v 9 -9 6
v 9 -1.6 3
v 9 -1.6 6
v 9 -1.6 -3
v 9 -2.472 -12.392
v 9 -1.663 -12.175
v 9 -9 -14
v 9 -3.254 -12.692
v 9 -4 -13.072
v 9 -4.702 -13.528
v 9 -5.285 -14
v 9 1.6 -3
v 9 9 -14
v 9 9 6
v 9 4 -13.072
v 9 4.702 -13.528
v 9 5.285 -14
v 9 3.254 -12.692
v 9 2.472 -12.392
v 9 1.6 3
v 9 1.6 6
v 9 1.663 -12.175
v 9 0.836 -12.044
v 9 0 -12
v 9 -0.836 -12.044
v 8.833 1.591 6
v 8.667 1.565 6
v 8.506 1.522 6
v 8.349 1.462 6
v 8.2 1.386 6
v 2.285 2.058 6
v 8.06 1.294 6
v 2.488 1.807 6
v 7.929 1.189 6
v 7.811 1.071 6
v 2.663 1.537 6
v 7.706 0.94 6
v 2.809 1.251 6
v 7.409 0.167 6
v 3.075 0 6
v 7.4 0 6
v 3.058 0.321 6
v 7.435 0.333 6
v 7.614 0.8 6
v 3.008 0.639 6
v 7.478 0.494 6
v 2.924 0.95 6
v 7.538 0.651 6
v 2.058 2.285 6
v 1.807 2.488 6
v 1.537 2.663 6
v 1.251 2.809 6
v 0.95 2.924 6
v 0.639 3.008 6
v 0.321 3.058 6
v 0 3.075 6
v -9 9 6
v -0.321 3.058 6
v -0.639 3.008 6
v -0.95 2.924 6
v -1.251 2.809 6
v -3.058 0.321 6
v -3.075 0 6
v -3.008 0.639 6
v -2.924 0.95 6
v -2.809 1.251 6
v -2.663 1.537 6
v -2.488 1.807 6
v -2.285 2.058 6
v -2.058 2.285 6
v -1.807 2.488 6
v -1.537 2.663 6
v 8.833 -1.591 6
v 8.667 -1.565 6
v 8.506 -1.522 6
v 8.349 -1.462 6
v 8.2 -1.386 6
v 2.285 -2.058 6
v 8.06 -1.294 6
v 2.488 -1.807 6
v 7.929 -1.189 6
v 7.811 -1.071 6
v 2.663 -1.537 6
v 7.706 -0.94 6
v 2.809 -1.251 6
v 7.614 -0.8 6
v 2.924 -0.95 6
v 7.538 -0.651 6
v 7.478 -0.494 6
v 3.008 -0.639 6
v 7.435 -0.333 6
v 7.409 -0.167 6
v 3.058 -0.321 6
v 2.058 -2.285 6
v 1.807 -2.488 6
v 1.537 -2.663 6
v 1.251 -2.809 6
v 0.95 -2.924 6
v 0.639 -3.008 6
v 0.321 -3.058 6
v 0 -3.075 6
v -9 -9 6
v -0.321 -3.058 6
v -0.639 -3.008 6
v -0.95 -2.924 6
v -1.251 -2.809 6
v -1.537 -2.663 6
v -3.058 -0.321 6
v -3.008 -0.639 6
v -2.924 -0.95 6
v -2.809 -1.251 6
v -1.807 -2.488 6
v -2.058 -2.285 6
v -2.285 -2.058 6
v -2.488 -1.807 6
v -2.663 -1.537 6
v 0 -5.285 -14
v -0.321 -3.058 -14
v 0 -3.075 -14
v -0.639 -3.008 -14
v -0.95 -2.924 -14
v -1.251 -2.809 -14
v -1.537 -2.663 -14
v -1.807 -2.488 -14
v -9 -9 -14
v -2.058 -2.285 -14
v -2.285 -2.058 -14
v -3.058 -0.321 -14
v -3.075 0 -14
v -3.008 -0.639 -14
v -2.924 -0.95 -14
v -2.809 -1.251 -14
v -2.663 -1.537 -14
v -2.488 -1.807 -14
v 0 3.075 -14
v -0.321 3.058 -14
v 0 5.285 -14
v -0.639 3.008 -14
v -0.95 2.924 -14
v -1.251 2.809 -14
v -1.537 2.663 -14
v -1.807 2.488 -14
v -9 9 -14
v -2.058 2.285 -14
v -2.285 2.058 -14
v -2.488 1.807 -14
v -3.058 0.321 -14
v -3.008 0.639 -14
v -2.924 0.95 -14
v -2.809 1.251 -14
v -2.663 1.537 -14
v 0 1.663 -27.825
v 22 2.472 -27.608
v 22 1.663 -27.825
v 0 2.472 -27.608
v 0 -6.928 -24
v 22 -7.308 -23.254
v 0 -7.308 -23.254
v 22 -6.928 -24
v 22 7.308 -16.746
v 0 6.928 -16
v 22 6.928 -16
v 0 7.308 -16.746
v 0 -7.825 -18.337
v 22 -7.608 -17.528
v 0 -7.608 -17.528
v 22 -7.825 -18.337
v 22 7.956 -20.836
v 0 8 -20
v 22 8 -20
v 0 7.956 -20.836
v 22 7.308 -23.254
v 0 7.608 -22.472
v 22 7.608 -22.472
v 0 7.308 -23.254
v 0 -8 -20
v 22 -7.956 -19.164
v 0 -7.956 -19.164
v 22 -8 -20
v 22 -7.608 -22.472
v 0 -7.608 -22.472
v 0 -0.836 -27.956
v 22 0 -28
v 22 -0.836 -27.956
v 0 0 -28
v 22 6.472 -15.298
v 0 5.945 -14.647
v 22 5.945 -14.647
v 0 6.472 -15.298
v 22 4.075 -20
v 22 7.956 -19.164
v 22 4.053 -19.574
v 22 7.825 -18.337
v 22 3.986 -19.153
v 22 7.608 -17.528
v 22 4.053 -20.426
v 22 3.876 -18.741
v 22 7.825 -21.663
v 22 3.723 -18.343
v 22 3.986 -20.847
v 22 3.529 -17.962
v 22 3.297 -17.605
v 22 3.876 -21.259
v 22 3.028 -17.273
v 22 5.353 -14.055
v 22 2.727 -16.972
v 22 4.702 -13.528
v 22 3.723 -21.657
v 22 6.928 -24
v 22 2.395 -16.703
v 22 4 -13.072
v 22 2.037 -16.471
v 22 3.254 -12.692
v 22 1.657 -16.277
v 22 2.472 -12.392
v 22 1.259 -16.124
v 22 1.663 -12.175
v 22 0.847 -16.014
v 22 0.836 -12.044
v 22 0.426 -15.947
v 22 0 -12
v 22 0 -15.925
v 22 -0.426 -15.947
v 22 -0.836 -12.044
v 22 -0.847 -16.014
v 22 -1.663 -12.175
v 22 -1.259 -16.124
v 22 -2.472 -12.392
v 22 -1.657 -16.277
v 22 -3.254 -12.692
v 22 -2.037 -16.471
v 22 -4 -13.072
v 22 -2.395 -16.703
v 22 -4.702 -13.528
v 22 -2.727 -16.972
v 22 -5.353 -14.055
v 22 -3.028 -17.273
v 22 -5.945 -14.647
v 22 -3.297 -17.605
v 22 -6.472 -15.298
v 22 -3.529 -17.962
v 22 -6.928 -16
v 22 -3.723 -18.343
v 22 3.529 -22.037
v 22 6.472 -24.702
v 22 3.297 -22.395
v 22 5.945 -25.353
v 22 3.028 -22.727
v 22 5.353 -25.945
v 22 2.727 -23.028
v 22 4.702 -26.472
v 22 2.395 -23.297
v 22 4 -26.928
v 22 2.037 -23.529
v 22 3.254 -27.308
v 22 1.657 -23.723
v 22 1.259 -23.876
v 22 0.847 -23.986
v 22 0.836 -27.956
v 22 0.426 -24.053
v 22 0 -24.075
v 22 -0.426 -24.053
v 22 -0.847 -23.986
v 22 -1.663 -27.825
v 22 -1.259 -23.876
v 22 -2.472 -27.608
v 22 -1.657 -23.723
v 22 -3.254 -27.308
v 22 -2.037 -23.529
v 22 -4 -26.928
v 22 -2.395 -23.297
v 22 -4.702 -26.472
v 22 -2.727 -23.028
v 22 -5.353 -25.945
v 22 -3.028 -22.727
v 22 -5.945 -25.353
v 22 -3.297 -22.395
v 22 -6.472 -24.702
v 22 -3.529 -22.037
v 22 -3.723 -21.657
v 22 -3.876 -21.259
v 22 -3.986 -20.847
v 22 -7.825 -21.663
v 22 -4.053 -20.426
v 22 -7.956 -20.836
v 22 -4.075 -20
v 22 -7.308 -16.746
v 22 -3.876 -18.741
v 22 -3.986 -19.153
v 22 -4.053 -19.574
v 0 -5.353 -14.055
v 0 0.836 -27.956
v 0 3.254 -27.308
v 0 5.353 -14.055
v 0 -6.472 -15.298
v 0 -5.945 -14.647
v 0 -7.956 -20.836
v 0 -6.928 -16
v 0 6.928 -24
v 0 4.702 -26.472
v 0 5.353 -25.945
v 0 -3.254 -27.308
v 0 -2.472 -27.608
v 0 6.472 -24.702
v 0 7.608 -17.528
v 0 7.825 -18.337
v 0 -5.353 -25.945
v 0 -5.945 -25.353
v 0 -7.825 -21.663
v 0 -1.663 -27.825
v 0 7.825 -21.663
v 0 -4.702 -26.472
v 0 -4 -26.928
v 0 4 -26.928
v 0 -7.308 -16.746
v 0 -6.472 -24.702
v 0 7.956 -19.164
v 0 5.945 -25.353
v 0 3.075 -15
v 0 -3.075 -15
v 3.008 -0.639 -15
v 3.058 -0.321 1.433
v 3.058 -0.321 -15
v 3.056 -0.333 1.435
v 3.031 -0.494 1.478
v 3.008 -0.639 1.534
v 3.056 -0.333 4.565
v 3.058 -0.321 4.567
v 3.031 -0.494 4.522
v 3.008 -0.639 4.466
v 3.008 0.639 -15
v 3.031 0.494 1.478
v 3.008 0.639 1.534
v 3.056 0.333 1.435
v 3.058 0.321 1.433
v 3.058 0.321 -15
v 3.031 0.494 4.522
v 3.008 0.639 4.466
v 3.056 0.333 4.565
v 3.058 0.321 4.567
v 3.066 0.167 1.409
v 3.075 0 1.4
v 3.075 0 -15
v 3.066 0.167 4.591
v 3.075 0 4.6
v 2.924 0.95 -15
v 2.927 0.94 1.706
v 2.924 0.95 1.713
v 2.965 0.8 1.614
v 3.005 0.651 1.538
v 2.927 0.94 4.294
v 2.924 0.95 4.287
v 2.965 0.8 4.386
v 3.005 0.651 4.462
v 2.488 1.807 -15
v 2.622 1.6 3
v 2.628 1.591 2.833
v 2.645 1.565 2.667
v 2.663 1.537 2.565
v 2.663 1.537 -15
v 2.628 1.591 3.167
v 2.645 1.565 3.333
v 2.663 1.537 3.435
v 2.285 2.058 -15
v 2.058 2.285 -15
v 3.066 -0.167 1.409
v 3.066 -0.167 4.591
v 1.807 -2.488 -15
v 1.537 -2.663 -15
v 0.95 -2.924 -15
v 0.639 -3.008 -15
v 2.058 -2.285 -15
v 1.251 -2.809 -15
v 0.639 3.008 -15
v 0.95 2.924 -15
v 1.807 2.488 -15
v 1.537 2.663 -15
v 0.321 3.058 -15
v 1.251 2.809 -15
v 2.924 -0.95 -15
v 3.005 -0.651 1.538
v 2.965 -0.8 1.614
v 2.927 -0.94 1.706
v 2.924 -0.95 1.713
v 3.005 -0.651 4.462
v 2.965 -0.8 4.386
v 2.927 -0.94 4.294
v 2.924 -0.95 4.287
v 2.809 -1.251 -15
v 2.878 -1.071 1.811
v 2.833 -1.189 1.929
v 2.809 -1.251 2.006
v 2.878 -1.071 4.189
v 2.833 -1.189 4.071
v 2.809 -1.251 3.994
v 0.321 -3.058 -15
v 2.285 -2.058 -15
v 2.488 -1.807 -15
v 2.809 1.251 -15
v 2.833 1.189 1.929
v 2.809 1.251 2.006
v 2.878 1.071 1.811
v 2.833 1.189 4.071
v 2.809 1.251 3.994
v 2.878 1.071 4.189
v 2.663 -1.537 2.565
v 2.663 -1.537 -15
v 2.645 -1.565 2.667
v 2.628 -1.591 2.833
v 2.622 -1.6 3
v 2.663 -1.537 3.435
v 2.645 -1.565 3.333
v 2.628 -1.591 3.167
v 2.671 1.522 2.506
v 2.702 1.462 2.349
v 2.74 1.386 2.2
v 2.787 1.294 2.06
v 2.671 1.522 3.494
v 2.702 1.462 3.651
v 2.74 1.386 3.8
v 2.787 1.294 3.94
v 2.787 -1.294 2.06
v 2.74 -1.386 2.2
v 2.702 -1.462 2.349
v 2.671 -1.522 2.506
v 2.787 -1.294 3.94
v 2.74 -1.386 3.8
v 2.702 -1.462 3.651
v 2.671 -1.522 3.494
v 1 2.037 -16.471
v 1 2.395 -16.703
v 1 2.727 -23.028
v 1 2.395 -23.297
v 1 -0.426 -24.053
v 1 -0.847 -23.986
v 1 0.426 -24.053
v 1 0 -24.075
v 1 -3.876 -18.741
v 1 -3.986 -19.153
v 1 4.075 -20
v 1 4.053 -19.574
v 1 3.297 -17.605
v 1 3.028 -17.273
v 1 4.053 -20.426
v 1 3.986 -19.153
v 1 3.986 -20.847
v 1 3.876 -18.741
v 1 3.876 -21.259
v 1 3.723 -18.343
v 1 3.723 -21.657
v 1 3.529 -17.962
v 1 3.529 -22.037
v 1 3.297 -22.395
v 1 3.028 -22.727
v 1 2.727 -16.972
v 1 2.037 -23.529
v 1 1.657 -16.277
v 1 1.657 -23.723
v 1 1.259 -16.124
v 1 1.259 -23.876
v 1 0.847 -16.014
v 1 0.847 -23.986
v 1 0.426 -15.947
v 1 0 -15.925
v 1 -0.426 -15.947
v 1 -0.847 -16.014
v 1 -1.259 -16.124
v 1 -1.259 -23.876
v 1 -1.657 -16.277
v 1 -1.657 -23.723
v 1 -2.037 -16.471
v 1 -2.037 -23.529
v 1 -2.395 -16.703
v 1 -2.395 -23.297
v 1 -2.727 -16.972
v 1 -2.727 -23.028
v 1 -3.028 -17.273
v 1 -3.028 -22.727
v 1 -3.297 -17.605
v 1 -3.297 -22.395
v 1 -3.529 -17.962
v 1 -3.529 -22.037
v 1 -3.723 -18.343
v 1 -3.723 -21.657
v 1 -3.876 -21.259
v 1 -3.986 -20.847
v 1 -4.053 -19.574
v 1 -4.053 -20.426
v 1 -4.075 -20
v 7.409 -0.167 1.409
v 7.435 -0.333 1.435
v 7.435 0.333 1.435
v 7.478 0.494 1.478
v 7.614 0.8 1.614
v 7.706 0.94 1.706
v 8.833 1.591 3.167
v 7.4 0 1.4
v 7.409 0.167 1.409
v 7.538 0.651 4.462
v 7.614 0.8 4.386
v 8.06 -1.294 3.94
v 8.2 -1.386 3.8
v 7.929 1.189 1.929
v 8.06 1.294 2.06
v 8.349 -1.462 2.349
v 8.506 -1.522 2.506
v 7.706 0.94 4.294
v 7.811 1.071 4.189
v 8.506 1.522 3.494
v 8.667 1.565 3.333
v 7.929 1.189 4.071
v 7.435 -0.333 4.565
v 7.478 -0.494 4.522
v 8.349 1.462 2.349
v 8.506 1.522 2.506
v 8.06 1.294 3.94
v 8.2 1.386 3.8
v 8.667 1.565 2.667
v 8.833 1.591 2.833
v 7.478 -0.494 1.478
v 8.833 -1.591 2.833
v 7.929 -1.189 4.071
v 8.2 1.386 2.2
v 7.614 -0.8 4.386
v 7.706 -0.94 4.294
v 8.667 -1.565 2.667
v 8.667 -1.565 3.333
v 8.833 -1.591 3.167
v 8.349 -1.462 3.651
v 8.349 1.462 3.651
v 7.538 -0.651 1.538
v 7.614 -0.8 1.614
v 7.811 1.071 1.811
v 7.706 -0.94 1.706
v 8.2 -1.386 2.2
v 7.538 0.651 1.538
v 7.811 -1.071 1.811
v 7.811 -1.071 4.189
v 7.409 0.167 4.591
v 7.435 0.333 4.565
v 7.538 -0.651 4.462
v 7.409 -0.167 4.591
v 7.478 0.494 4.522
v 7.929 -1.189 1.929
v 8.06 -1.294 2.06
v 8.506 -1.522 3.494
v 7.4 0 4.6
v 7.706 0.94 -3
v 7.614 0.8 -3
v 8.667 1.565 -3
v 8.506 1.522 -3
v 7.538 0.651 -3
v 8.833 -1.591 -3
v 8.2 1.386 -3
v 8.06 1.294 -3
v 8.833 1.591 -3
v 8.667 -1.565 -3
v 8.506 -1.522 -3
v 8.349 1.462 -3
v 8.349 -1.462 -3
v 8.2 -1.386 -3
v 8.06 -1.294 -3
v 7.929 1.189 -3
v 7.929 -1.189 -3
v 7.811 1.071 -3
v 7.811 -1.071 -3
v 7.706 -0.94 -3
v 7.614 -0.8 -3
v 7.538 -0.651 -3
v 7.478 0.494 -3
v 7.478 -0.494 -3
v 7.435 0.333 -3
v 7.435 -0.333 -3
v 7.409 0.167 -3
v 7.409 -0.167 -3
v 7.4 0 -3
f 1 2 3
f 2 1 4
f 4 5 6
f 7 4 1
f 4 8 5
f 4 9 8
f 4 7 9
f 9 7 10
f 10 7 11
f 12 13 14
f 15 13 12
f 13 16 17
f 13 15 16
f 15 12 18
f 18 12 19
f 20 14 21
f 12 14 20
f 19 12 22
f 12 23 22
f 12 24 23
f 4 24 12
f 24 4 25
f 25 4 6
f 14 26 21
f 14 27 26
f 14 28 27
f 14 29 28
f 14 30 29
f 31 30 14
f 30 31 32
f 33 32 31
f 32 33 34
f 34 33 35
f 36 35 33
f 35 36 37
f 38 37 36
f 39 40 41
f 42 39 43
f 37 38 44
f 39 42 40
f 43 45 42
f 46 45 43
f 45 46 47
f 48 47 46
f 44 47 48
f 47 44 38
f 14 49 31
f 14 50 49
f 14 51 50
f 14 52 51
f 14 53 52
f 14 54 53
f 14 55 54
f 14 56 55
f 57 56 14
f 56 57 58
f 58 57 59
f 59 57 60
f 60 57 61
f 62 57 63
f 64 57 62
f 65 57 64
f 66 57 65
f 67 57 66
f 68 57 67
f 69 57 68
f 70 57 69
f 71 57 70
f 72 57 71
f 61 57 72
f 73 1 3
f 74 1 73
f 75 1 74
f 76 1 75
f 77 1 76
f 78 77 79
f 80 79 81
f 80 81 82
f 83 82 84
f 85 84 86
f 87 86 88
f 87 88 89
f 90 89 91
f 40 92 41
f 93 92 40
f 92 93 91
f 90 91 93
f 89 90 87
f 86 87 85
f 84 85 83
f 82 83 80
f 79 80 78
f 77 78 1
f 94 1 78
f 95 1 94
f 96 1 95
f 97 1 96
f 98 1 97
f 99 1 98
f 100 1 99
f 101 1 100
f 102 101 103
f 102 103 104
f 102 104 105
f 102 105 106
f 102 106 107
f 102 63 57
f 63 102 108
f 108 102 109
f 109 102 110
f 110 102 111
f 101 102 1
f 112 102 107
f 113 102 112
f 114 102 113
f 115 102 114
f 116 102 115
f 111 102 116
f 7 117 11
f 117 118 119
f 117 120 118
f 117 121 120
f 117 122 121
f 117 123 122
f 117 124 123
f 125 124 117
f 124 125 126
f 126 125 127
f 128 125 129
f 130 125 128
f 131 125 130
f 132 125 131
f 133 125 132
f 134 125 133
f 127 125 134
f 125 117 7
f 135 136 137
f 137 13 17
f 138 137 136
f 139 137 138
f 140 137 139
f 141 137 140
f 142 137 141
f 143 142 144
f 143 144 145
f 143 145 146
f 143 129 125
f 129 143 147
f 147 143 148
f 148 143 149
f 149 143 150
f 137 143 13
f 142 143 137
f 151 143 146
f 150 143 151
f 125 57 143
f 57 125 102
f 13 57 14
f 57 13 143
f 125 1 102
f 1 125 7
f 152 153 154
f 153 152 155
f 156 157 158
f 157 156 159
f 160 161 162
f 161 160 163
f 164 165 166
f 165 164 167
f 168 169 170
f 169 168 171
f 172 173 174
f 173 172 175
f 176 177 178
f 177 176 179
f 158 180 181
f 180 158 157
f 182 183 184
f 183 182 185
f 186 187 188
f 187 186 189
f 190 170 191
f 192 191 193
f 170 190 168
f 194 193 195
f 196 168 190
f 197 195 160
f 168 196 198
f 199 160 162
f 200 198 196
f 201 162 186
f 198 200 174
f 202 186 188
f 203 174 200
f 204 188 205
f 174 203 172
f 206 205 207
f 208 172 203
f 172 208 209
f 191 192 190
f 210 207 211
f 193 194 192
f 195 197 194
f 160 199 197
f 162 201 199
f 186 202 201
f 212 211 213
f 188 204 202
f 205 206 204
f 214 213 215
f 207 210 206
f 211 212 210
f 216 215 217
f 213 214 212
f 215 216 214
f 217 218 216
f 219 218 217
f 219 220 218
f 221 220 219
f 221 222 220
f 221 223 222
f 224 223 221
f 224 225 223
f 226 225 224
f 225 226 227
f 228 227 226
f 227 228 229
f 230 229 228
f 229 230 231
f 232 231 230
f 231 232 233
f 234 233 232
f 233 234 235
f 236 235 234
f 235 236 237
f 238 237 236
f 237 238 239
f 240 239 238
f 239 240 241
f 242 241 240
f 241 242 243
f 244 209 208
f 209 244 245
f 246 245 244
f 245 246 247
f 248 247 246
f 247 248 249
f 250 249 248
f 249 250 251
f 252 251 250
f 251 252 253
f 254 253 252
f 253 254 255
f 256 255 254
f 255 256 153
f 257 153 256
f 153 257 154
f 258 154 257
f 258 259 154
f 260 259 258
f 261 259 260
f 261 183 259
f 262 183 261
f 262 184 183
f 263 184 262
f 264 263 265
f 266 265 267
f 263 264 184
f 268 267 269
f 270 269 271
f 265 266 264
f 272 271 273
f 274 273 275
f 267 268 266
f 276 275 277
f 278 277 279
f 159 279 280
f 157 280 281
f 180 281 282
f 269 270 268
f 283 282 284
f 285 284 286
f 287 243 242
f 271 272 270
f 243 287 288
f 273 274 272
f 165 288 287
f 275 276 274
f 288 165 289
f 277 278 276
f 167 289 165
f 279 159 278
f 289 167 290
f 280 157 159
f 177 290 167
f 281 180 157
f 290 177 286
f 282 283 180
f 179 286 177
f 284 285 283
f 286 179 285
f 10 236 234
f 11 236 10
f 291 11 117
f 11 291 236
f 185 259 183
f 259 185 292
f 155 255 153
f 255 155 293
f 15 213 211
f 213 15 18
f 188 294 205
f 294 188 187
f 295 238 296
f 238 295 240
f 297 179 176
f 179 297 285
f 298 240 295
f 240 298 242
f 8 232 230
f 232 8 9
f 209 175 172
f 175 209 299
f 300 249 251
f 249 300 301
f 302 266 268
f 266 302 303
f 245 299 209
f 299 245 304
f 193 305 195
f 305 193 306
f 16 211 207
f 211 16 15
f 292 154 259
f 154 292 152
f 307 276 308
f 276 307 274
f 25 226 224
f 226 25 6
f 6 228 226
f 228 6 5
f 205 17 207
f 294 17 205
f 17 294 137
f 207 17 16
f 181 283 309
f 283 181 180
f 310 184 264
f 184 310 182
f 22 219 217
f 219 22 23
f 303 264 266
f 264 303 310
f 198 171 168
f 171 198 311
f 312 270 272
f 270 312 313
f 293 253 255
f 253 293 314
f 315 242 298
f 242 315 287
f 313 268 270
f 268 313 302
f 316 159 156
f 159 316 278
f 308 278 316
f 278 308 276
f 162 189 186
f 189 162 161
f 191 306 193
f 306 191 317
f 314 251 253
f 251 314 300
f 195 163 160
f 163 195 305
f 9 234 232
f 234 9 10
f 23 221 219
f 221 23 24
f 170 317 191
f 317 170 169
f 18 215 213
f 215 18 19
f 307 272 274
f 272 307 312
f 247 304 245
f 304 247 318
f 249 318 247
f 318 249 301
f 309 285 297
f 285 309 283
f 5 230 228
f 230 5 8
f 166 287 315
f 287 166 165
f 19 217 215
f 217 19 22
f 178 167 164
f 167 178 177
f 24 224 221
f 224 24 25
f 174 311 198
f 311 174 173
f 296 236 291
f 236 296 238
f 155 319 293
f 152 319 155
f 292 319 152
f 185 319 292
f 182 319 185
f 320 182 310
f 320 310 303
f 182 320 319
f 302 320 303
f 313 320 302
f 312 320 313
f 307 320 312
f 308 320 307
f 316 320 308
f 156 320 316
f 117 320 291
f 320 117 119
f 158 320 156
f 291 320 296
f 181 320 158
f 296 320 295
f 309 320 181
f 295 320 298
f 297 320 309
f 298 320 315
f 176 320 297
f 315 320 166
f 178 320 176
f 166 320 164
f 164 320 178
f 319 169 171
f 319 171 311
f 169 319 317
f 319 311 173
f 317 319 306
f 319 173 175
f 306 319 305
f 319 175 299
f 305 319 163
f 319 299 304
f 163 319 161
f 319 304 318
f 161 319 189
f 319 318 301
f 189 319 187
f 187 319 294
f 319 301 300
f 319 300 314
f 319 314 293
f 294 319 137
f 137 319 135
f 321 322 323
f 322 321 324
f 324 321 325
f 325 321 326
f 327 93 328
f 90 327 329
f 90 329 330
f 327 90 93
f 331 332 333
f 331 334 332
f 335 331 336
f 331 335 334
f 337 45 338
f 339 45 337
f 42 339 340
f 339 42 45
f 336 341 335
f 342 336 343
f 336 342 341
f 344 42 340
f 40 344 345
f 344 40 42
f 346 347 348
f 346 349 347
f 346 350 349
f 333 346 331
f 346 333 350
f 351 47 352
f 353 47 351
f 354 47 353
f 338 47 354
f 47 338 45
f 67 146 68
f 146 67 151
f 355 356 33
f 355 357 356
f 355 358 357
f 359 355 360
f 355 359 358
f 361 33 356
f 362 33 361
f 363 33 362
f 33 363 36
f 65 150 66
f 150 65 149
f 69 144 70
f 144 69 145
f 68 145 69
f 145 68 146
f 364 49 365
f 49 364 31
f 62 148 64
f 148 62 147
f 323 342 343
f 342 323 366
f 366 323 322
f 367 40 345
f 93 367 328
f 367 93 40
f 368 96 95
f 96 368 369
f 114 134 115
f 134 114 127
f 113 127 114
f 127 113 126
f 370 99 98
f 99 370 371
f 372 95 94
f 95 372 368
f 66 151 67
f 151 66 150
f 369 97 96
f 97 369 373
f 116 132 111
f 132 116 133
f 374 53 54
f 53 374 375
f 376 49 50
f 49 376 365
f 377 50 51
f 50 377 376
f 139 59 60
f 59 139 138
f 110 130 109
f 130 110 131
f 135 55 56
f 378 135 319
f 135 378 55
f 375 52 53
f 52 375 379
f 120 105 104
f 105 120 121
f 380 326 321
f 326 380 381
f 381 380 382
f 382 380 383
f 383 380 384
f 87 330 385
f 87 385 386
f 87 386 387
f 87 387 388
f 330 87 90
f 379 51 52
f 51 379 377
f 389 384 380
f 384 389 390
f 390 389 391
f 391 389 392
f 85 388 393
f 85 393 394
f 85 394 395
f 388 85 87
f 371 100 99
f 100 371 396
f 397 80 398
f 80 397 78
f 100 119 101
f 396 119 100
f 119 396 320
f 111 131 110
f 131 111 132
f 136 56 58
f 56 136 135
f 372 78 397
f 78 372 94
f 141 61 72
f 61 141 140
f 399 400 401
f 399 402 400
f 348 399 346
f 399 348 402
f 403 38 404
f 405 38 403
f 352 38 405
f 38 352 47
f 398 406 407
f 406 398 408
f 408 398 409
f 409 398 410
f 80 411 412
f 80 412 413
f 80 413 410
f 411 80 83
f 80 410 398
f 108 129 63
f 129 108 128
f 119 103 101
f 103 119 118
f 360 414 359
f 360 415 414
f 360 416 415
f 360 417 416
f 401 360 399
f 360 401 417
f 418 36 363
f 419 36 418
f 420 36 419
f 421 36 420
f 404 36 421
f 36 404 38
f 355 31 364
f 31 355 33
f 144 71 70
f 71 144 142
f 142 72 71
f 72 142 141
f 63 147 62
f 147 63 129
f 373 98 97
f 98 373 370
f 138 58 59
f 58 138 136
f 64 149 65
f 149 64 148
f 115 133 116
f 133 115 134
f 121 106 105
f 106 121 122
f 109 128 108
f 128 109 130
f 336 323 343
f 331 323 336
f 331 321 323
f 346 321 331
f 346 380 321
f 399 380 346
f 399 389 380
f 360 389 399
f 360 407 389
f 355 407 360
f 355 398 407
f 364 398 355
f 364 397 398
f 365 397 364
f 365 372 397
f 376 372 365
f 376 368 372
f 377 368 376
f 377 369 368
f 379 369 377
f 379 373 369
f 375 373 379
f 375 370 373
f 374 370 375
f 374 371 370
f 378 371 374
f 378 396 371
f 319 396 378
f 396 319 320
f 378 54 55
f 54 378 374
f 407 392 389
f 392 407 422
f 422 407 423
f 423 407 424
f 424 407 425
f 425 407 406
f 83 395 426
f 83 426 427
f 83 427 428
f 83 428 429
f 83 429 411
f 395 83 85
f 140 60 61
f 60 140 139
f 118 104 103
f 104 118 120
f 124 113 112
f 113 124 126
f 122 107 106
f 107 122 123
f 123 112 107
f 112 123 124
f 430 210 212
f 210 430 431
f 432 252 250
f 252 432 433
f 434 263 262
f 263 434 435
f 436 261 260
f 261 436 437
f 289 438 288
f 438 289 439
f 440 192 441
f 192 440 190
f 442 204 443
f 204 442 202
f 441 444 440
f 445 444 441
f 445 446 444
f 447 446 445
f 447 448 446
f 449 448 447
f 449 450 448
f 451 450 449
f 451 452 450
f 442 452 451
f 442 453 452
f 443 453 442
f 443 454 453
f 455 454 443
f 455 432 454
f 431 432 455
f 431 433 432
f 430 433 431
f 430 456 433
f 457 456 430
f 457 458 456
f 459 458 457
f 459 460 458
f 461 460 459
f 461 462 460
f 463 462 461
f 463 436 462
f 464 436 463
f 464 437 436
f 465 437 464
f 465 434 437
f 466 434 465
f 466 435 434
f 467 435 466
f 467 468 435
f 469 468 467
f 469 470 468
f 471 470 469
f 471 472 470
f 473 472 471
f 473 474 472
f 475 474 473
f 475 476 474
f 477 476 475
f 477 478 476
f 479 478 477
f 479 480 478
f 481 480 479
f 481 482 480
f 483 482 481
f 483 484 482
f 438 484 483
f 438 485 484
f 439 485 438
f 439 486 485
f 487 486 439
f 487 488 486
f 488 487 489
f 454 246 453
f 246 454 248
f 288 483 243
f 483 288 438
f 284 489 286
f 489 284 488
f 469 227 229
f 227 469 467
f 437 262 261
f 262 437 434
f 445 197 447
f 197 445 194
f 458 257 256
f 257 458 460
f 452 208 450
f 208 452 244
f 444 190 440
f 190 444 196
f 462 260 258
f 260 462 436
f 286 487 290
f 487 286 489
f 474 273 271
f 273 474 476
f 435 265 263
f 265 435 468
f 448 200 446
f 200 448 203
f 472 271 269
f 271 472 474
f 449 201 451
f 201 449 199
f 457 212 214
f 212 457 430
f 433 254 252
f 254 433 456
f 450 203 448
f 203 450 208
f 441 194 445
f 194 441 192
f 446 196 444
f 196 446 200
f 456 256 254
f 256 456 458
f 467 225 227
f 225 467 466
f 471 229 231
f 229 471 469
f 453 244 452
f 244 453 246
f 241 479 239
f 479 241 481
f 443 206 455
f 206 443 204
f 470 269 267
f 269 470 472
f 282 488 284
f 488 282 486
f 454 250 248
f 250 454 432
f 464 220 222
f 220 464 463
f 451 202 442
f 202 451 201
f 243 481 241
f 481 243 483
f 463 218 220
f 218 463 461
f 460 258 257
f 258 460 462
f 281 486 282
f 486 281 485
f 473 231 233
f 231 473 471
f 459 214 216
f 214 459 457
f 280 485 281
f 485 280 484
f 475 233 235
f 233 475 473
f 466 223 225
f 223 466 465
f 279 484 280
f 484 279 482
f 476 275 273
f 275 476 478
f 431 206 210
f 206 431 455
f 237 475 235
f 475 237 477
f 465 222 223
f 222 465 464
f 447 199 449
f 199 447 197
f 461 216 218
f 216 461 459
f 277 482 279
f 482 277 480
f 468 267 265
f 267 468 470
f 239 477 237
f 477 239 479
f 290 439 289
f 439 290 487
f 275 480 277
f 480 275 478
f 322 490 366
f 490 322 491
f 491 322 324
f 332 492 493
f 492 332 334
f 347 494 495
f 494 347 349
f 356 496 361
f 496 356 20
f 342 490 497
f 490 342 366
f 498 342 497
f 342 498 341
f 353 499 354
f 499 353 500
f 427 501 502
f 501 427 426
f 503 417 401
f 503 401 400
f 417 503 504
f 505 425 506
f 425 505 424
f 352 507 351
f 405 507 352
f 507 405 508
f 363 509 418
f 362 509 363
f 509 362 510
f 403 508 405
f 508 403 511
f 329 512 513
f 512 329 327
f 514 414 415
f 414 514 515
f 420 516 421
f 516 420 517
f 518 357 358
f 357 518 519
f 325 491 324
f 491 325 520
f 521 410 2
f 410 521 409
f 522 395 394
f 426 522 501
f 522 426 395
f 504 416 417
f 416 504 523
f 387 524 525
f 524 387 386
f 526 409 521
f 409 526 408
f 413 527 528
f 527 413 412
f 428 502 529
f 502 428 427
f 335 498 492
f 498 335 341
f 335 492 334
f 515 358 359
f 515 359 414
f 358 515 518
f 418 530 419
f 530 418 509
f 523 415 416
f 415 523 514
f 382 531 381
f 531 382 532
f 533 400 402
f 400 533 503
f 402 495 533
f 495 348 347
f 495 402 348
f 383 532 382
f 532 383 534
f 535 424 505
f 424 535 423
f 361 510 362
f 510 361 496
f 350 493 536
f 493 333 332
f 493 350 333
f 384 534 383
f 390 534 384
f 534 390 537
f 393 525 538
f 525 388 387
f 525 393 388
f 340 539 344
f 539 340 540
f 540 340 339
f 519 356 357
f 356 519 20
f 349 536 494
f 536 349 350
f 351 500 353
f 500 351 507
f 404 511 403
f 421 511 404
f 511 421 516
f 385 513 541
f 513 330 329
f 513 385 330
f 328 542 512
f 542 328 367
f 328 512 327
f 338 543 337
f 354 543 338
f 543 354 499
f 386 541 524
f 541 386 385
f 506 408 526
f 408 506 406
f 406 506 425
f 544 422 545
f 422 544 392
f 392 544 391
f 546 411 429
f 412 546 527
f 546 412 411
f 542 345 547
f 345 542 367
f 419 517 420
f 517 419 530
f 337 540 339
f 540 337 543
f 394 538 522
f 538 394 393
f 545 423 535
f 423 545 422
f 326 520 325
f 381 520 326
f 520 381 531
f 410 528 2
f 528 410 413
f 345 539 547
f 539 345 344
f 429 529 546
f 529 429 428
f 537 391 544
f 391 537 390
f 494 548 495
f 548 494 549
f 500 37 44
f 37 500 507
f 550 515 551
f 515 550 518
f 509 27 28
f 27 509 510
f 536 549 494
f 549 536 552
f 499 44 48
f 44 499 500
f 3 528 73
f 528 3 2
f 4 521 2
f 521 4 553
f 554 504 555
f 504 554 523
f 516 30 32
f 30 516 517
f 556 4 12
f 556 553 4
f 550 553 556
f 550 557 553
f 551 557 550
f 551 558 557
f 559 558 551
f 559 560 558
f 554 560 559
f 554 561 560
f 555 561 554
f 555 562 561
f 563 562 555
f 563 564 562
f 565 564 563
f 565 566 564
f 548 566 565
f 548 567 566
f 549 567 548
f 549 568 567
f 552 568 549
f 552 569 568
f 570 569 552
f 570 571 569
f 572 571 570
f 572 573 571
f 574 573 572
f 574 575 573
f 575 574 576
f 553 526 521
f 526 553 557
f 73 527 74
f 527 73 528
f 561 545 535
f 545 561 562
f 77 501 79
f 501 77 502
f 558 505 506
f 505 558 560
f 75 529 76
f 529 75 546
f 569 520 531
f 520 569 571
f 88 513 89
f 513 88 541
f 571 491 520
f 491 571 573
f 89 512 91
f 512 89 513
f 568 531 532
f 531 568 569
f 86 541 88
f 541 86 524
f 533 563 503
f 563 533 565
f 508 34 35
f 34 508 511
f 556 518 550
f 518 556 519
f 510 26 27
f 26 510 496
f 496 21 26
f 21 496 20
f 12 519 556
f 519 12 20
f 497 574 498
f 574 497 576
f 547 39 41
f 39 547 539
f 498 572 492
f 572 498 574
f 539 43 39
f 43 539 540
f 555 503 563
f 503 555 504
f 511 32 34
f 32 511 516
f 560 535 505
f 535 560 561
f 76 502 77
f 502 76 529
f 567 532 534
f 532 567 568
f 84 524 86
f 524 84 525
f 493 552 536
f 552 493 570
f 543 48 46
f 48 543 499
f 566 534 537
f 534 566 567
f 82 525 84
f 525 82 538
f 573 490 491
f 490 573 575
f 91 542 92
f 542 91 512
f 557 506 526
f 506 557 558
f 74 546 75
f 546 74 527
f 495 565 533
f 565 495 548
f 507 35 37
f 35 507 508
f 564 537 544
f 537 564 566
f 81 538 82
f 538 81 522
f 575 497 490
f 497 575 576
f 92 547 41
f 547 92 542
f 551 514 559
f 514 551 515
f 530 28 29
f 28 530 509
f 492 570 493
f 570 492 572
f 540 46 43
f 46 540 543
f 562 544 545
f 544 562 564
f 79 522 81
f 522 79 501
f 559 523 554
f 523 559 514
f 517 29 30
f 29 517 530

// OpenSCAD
// ============================================================
// arm_mount.scad  —  Furuta 臂座
// 功能：连接 6mm 垂直主轴 → 8mm 水平铝管
// ============================================================

$fn  = 60;
TOL  = 0.15;   // 孔公差 (紧配合可减小)
WALL = 4;      // 孔壁最小厚度 mm

// ---------- 参数 ----------
SHAFT_D = 6;         // 主轴直径
TUBE_D  = 8;         // 铝管外径
TUBE_L  = 16;        // 管插入深度
SCREW_D = 3.0;       // 顶丝孔 (M3)

BODY_H  = 20;        // 总高度
BODY_W  = 18;        // 主轴块宽
BODY_D  = 18;        // 主轴块深
BOSS_D  = 16;        // 管套外径

// ---------- 主体 ----------
difference() {
    union() {
        // 主轴块 (居中)
        translate([-BODY_W/2, -BODY_D/2, -(TUBE_L/2+WALL+2)])
            cube([BODY_W, BODY_D, BODY_H]);

        // 管套 (水平伸出)
        translate([0, 0, -(TUBE_L/2+WALL) - TUBE_L/2])
            rotate([0, 90, 0])
                cylinder(d=BOSS_D, h=TUBE_L + WALL + 2);
    }

    // 主轴孔 6mm (垂直贯通)
    cylinder(d=SHAFT_D + TOL, h=BODY_H + 10, center=true);

    // 铝管孔 8mm (水平)
    translate([1, 0, -(TUBE_L/2+WALL) - TUBE_L/2])
        rotate([0, 90, 0])
            cylinder(d=TUBE_D + TOL, h=TUBE_L + WALL + 5);

    // M3 顶丝 — 锁主轴 (侧面 x)
    translate([0, 0, 3])
        rotate([0, 90, 0])
            cylinder(d=SCREW_D + 0.2, h=BODY_W/2 + 5);

    // M3 顶丝 — 锁铝管 (顶面)
    translate([TUBE_L/2 + 1, 0, -3])
        cylinder(d=SCREW_D + 0.2, h=10);
}


// ============================================================
// Usage:
//   1. 6mm 主轴从下方插入中心孔，侧面 M3 顶丝锁紧
//   2. 8mm 铝管从左侧插入水平孔，顶部 M3 顶丝锁紧
//   3. 臂座随主轴一起旋转，铝管径向伸出 = 水平臂
// ============================================================
